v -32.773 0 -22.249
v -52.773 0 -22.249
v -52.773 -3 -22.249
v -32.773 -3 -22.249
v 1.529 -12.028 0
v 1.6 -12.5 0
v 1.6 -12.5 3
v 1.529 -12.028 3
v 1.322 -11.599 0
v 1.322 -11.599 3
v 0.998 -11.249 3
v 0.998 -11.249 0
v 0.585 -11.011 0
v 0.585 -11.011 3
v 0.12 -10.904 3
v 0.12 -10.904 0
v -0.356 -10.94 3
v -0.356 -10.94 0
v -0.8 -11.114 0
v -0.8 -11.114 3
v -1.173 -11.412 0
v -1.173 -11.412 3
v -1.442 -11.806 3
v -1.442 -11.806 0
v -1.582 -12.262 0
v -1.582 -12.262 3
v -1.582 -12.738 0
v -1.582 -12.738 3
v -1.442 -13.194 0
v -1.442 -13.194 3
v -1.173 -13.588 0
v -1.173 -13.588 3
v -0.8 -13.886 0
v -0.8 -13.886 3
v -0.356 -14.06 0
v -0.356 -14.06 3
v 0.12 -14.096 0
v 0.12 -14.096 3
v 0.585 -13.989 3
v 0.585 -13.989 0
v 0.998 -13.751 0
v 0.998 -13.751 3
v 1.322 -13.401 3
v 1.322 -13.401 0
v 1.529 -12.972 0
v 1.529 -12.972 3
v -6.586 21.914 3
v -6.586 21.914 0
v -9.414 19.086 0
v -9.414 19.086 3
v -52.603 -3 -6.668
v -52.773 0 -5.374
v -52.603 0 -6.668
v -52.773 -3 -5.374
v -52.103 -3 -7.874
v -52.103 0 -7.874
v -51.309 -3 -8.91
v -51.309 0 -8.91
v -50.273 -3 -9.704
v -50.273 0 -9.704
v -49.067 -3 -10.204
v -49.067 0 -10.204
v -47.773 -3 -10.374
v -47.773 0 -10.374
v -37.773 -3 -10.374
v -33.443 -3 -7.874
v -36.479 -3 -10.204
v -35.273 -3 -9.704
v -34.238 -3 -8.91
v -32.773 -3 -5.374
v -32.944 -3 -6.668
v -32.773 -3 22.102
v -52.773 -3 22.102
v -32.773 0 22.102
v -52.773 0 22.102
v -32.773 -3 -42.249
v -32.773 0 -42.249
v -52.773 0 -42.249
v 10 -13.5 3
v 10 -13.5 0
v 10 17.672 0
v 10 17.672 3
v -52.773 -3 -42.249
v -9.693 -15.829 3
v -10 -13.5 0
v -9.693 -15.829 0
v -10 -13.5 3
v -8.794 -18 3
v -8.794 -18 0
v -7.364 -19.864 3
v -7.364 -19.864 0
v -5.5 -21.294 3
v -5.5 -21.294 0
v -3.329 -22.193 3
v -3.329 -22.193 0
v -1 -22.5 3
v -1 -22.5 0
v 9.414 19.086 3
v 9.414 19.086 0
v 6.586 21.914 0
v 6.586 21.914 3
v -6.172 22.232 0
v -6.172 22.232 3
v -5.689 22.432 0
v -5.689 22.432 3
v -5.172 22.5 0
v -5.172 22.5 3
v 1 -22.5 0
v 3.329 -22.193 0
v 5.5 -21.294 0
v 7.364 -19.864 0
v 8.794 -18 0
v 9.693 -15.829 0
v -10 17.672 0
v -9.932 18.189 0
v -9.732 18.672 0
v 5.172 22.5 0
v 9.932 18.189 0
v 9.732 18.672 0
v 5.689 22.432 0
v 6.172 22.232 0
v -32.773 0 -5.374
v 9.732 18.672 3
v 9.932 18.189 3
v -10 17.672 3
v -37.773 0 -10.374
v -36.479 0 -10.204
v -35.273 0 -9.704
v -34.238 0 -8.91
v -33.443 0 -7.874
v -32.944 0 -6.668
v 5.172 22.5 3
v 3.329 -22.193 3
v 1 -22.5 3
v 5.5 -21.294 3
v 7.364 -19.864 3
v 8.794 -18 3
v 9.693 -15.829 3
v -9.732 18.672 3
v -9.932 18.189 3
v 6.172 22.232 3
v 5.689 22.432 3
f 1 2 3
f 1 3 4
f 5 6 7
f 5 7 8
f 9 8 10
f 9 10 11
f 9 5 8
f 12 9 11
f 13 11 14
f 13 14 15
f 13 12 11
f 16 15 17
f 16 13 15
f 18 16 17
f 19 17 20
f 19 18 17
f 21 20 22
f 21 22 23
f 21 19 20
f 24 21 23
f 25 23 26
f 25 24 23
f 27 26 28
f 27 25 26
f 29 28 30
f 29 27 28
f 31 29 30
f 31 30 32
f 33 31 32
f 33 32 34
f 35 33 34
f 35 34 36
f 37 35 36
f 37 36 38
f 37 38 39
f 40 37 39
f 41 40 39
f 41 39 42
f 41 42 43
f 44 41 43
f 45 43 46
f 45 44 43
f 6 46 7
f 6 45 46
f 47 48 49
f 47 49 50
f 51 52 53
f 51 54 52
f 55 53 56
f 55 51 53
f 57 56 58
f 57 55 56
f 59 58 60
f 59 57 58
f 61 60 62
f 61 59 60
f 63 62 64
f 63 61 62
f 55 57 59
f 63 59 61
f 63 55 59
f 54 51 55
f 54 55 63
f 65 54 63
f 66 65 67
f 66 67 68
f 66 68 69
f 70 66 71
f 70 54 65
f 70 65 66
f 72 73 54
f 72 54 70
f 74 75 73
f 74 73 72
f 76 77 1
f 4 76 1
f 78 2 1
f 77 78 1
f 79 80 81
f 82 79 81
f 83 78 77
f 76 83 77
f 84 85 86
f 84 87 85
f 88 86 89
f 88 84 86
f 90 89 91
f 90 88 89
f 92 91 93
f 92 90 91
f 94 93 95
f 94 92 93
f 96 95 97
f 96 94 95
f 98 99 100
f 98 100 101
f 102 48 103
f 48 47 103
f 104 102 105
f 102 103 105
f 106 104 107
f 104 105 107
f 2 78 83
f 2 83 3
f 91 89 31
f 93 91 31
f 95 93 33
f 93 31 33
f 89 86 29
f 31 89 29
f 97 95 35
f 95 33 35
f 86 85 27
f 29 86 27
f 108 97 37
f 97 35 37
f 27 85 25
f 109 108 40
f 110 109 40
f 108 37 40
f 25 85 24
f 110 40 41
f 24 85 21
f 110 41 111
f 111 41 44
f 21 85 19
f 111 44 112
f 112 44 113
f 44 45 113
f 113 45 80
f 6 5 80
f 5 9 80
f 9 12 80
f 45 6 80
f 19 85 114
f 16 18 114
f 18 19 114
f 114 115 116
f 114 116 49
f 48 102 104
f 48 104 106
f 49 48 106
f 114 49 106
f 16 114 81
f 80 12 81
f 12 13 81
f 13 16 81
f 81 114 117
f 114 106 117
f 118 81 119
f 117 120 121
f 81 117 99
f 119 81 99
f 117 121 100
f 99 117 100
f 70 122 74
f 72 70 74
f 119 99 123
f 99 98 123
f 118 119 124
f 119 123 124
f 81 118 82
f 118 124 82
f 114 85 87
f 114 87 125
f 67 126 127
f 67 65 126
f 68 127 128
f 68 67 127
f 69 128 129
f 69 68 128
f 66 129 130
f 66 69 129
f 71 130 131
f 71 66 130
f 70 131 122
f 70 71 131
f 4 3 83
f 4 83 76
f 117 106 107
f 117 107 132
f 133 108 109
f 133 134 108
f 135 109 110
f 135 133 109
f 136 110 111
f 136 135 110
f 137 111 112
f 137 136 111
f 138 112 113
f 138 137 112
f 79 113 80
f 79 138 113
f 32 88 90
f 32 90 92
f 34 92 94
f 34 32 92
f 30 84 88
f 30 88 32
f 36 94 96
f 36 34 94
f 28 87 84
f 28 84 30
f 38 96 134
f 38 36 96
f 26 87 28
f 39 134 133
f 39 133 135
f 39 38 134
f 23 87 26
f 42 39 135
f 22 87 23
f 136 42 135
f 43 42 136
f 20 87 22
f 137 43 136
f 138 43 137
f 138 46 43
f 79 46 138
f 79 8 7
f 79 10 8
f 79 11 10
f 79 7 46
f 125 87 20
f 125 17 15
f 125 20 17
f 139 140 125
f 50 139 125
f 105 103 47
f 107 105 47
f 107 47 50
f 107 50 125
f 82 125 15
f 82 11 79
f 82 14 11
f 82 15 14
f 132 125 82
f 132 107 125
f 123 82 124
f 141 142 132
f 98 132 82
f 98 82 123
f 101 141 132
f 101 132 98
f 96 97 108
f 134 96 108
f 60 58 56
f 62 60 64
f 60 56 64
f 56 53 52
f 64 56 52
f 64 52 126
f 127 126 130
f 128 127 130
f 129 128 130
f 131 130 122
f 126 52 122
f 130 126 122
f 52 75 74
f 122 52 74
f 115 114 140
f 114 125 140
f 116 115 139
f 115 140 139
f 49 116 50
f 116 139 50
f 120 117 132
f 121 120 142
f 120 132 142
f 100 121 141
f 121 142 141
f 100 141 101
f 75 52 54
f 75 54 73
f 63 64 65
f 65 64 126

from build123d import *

# Parameters (mm, degrees)
F0_W     = 20
F0_H     = 45
F0_R     = 1.6
F1_DEPTH = 3
F2_R     = 9
F3_SIZE  = 4
F4_R     = 2
F5_W     = 20
F5_H     = 20
F6_DEPTH = 3
F5_H_2   = 32.4758281931
F7_R     = 5


with BuildPart() as f1:
    # F0 (on Top) → F1 (new body)
    with BuildSketch(Plane.XY):
        Rectangle(F0_W, F0_H)
        with Locations((0, -12.5)):
            Circle(F0_R, mode=Mode.SUBTRACT)
    extrude(amount=F1_DEPTH)

    # F2
    f2_edges = [f1.edges().sort_by_distance(p)[0] for p in [
        (10, -22.5, 1.5),
        (-10, -22.5, 1.5),
    ]]
    fillet(f2_edges, radius=F2_R)

    # F3
    f3_edges = [f1.edges().sort_by_distance(p)[0] for p in [
        (-10, 22.5, 1.5),
        (10, 22.5, 1.5),
    ]]
    chamfer(f3_edges, length=F3_SIZE)

    # F4
    f4_edges = [f1.edges().sort_by_distance(p)[0] for p in [
        (-6, 22.5, 1.5),
        (6, 22.5, 1.5),
        (10, 18.5, 1.5),
        (-10, 18.5, 1.5),
    ]]
    fillet(f4_edges, radius=F4_R)


with BuildPart() as f6:
    # F5 (on Front) → F6 (new body)
    with BuildSketch(Plane.XZ):
        with Locations((-42.7732223272, -32.2486439347)):
            Rectangle(F5_W, F5_H)
    extrude(amount=F6_DEPTH)


with BuildPart() as f6b:
    # F5 (on Front) → F6, piece 2 (new body)
    with BuildSketch(Plane.XZ):
        with Locations((-42.7732223272, 5.8636930771)):
            Rectangle(F5_W, F5_H_2)
    extrude(amount=F6_DEPTH)

    # F7
    f7_edges = [f6b.edges().sort_by_distance(p)[0] for p in [
        (-32.773222, -1.5, -10.374221),
        (-52.773222, -1.5, -10.374221),
    ]]
    fillet(f7_edges, radius=F7_R)


solid = Compound([f1.part, f6.part, f6b.part])
